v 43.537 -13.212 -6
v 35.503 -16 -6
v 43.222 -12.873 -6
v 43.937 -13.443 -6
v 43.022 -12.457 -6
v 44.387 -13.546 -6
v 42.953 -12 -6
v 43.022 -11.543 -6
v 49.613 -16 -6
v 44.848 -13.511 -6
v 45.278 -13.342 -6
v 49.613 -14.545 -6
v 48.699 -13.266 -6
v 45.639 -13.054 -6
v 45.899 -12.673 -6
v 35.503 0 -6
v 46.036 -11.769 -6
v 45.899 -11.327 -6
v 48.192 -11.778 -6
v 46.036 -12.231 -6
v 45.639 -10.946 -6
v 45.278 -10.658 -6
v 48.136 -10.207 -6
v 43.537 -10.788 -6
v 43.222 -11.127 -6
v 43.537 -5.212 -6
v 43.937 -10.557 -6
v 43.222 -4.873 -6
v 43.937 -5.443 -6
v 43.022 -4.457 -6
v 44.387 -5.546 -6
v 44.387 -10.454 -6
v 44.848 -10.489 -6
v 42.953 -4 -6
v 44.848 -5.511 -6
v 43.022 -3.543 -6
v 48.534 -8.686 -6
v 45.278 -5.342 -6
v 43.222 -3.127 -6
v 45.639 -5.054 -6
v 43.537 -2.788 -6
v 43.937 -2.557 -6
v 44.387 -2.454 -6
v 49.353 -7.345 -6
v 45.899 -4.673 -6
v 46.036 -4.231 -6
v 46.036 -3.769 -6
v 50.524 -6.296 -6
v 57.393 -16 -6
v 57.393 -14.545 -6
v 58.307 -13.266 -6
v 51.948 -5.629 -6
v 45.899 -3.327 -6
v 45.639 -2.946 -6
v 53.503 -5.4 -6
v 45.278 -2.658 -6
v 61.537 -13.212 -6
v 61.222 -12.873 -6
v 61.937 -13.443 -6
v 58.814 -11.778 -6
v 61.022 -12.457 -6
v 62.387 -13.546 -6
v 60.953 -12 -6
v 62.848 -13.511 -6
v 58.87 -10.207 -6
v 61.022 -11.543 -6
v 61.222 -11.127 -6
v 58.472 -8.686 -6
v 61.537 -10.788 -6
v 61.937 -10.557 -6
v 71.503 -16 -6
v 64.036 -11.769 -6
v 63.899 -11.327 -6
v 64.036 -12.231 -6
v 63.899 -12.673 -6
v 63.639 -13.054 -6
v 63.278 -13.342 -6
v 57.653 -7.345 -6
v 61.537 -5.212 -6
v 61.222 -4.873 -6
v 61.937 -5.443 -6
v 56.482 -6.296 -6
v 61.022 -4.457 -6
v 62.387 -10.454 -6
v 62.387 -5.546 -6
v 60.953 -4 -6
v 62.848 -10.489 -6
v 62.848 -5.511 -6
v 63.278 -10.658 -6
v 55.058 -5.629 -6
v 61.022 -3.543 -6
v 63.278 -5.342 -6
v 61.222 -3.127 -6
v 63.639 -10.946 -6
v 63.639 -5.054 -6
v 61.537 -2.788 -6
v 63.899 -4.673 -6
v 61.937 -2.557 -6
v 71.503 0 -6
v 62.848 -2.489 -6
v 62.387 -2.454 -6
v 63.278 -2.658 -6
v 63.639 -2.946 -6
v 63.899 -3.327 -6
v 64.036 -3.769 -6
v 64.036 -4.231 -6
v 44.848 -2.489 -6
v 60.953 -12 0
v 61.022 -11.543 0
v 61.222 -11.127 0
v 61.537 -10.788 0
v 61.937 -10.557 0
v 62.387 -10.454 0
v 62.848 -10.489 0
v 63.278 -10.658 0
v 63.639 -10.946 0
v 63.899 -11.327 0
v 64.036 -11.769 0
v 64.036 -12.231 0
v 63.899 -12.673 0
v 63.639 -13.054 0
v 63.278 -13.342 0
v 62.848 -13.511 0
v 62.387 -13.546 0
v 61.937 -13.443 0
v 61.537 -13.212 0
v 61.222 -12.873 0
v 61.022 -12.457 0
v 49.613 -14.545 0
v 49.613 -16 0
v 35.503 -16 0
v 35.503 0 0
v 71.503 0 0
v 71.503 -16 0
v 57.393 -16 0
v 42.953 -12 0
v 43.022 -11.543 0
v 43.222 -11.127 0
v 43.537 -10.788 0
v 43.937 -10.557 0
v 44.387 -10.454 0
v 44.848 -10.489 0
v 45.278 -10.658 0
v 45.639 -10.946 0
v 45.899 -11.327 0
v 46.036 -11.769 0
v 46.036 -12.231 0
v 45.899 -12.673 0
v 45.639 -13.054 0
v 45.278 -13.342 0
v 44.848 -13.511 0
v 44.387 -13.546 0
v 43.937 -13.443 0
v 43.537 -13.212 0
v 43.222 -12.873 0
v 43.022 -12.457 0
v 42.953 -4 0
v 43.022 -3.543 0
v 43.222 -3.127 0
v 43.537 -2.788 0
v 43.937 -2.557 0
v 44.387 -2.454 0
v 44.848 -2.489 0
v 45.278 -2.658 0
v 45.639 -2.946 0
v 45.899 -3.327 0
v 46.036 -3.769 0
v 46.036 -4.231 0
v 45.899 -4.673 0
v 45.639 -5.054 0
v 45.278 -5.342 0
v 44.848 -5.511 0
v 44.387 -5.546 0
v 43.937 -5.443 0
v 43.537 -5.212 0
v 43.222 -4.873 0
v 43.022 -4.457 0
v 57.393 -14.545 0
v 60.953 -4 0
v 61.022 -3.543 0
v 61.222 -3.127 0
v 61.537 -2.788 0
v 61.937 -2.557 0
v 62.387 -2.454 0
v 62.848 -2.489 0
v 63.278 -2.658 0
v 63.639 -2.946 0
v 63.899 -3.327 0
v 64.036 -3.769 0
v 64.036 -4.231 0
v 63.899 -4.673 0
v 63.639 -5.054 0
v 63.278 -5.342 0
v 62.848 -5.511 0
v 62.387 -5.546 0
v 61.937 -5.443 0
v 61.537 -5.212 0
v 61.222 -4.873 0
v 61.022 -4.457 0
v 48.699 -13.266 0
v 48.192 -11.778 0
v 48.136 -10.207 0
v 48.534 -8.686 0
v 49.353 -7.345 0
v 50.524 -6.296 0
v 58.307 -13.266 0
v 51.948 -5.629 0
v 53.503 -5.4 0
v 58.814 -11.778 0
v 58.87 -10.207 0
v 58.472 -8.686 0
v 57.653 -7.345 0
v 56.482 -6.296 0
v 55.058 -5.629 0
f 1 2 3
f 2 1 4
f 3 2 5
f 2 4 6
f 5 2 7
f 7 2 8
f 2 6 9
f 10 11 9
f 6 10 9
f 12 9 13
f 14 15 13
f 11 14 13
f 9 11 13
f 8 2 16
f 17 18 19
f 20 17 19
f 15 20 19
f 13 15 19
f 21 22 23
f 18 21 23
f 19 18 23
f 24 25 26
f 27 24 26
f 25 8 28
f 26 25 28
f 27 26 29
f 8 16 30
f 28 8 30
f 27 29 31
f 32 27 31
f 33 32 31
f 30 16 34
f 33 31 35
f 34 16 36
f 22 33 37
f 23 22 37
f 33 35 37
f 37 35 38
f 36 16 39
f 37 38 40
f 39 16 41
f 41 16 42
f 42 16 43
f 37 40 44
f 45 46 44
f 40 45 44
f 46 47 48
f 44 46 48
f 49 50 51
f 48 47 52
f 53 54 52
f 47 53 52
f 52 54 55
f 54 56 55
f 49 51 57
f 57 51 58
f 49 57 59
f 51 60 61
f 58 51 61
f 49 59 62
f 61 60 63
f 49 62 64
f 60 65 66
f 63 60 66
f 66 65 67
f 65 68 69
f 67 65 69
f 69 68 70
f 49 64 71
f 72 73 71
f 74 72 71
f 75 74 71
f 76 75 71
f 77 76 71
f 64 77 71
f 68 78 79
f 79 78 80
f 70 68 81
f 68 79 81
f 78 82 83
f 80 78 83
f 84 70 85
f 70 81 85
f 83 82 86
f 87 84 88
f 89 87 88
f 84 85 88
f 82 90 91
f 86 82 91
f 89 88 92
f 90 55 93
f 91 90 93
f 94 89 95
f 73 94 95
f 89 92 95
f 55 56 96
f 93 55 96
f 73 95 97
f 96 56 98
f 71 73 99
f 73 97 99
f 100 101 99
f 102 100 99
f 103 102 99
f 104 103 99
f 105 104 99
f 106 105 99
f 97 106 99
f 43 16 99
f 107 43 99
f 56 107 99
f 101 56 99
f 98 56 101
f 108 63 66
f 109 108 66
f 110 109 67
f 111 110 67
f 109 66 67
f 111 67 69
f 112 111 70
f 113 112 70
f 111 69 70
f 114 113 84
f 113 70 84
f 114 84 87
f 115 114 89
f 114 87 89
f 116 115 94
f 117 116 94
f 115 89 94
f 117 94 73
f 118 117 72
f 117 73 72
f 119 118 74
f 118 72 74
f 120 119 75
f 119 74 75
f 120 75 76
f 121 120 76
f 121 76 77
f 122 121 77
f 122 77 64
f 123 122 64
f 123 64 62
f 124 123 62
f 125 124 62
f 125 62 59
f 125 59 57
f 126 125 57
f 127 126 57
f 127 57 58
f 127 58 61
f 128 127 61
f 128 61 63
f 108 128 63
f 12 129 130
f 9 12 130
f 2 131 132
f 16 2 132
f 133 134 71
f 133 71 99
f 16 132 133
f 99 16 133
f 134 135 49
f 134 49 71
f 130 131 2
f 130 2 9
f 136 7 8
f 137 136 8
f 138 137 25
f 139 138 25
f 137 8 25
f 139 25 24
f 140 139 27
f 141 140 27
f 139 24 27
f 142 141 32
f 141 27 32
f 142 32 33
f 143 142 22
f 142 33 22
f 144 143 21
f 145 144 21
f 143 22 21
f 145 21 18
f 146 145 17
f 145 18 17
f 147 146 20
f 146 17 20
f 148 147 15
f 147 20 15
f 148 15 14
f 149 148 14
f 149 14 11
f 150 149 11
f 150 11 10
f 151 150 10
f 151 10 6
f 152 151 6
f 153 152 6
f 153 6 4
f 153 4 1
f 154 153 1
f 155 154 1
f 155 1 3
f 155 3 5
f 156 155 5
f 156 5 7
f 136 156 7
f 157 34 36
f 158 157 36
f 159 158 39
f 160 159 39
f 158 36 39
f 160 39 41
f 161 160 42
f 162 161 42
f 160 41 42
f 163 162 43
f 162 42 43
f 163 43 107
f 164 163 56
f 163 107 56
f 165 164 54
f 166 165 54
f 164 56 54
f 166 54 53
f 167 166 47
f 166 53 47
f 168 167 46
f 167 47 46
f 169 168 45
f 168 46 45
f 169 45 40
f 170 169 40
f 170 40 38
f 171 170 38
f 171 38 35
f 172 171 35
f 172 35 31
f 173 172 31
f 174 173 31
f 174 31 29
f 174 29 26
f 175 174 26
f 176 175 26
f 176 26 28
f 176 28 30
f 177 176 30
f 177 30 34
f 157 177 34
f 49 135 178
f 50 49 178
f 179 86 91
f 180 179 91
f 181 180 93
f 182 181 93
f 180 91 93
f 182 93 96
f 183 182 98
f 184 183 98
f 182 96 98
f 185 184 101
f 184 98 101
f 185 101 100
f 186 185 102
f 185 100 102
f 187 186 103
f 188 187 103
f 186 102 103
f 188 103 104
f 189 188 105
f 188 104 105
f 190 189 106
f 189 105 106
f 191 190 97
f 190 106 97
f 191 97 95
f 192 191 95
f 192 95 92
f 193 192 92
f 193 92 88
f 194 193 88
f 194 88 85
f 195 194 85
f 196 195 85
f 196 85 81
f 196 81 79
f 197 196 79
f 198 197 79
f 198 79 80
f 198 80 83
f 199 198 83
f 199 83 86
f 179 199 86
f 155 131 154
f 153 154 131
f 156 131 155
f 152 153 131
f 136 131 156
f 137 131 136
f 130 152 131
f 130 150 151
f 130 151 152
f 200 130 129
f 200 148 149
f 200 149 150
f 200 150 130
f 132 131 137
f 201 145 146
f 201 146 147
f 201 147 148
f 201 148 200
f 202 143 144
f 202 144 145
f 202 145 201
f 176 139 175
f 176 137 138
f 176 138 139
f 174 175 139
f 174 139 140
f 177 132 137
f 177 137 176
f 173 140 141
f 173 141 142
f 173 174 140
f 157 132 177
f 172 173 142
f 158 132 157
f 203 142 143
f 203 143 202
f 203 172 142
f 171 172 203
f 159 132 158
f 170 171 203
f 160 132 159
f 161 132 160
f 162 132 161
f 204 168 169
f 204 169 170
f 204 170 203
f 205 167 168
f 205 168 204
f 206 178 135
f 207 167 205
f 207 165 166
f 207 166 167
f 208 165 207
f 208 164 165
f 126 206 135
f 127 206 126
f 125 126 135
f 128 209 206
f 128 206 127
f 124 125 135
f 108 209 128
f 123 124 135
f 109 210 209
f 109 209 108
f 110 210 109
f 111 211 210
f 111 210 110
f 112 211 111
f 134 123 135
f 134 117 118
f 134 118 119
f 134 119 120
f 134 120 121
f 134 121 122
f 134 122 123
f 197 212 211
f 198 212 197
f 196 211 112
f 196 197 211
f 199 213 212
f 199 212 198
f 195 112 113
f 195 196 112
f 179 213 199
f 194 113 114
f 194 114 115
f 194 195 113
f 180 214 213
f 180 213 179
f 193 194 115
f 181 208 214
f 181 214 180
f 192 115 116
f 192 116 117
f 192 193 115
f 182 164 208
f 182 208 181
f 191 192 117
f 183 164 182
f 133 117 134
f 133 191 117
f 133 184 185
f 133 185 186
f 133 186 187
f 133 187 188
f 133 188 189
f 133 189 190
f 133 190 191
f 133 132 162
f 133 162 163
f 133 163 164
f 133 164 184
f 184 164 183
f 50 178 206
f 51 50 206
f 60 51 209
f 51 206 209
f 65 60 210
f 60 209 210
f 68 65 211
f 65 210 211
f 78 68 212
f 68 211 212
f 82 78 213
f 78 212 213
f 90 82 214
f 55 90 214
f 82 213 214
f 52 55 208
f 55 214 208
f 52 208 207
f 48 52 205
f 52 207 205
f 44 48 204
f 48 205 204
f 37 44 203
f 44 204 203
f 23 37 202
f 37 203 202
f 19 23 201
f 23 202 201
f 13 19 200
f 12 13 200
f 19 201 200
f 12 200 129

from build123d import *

# Parameters (mm, degrees)
SZKIC1_W                    = 36
SZKIC1_H                    = 16
DODANIE_WYCI_GNI_CIE1_DEPTH = 6
WYTNIJ_WYCI_GNI_CIE1_DEPTH  = 6
SZKIC3_R                    = 1.55
WYTNIJ_WYCI_GNI_CIE2_DEPTH  = 74.51650454


with BuildPart() as part:
    # Szkic1 → Dodanie-wyciągnięcie1 (new body)
    with BuildSketch(Plane.XY):
        with Locations((53.502982034, -8)):
            Rectangle(SZKIC1_W, SZKIC1_H)
    extrude(amount=-DODANIE_WYCI_GNI_CIE1_DEPTH)

    # Szkic2 → Wytnij-wyciągnięcie1 (cut)
    with BuildSketch(Plane.XY):
        with BuildLine():
            Line((49.612982034, -14.93), (49.612982034, -16))
            Line((49.612982034, -16), (57.392982034, -16))
            Line((57.392982034, -16), (57.392982034, -14.93))
            Line((57.392982034, -14.93), (57.392982034, -14.545383825))
            ThreePointArc((57.392982034, -14.545383825), (53.502982034, -5.4), (49.612982034, -14.545383825))
            Line((49.612982034, -14.545383825), (49.612982034, -14.93))
        make_face()
    extrude(amount=-WYTNIJ_WYCI_GNI_CIE1_DEPTH, mode=Mode.SUBTRACT)

    # Szkic3 → Wytnij-wyciągnięcie2 (cut, through all)
    with BuildSketch(Plane(origin=(0, 0, -6), x_dir=(-1, 0, 0), z_dir=(0, 0, -1))):
        with Locations((-44.502982034, -12)):
            Circle(SZKIC3_R)
        with Locations((-44.502982034, -4)):
            Circle(SZKIC3_R)
        with Locations((-62.502982034, -12)):
            Circle(SZKIC3_R)
        with Locations((-62.502982034, -4)):
            Circle(SZKIC3_R)
    extrude(amount=-WYTNIJ_WYCI_GNI_CIE2_DEPTH, mode=Mode.SUBTRACT)


solid = part.part
